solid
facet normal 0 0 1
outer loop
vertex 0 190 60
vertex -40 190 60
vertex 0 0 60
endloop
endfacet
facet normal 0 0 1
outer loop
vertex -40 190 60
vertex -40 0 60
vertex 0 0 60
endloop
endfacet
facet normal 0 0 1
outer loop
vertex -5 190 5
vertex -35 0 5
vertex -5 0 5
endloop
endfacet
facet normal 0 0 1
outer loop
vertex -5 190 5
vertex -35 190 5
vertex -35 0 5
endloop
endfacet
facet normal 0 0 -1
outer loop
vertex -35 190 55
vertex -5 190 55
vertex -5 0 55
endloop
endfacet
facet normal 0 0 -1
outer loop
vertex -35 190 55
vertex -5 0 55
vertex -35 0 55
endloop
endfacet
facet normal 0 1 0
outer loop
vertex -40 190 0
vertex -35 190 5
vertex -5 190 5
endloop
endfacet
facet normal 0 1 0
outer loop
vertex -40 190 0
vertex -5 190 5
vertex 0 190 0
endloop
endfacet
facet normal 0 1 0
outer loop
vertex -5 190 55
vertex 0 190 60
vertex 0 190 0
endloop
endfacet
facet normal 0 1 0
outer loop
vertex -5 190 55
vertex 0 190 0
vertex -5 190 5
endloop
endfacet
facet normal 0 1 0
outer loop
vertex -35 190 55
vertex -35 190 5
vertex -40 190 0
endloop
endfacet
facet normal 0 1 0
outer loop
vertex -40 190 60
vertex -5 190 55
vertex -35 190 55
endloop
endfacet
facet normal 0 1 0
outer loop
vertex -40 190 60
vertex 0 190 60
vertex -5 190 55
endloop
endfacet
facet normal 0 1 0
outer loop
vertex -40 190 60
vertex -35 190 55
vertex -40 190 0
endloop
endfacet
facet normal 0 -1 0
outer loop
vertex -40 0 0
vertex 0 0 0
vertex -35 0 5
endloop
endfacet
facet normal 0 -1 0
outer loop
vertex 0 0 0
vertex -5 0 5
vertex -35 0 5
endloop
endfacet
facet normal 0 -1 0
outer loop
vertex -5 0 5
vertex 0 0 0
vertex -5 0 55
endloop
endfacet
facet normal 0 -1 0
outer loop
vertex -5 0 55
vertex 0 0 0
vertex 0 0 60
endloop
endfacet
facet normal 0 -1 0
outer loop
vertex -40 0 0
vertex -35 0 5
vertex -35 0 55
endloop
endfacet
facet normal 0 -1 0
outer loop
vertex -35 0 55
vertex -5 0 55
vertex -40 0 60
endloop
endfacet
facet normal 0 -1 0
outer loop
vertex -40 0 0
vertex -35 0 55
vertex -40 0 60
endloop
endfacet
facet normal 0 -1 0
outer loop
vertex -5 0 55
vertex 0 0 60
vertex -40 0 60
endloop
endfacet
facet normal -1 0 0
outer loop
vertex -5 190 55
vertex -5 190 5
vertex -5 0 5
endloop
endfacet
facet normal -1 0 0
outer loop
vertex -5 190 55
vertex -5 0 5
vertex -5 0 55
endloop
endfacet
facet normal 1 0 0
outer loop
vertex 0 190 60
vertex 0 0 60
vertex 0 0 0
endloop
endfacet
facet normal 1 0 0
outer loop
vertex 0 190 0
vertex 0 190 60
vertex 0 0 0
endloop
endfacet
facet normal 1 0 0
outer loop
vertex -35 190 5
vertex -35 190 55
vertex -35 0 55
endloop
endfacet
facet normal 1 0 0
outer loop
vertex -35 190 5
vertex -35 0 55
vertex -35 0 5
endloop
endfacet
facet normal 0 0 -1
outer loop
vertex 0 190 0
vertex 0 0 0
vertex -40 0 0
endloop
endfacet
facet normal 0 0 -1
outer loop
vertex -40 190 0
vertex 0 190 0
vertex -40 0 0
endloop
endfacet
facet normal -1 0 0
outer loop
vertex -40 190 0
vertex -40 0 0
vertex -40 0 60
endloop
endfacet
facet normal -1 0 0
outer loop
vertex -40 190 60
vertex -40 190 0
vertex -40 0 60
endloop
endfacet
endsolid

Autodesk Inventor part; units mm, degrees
ref_plane "YZ Plane" through (0, 0, 0) normal (1, 0, 0) x (0, 1, 0)
ref_plane "XZ Plane" through (0, 0, 0) normal (0, 1, 0) x (-1, 0, 0)
ref_plane "XY Plane" through (0, 0, 0) normal (0, 0, 1) x (1, 0, 0)
sketch "Эскиз1" plane through (0, 0, 0) normal (0, 1, 0) x (-1, 0, 0)
  line L0 (0, 0) -> (40, 0)
  line L1 (40, 0) -> (40, 60)
  line L2 (40, 60) -> (0, 60)
  line L3 (0, 60) -> (0, 0)
  dimension "d0" = 60
  dimension "d1" = 40
extrude "Выдавливание1" add sketch "Эскиз1" along normal blind 190
sketch "Эскиз2" plane through (0, 190, 0) normal (0, 1, 0) x (1, 0, 0)
  line L0 (-35, -5) -> (-5, -5)
  line L1 (-5, -5) -> (-5, -55)
  line L2 (-5, -55) -> (-35, -55)
  line L3 (-35, -55) -> (-35, -5)
  line L4 (-40, 0) -> (-40, -60) projected
  line L5 (0, -60) -> (0, 0) projected
  line L6 (0, 0) -> (-40, 0) projected
  line L7 (-40, -60) -> (0, -60) projected
  dimension "d4" = 5
  dimension "d5" = 5
  dimension "d6" = 5
  dimension "d7" = 5
extrude "Выдавливание2" cut sketch "Эскиз2" against normal through all contours L0 L1 L2 L3
sketch "Эскиз3" plane through (-40, 0, 60) normal (0, 0, 1) x (1, 0, 0)
  point P0 (40, 0)
equation "\"d5\" = d4"
equation "\"d6\" = d4"
equation "\"d7\" = d4"
properties part number "БРУС"
